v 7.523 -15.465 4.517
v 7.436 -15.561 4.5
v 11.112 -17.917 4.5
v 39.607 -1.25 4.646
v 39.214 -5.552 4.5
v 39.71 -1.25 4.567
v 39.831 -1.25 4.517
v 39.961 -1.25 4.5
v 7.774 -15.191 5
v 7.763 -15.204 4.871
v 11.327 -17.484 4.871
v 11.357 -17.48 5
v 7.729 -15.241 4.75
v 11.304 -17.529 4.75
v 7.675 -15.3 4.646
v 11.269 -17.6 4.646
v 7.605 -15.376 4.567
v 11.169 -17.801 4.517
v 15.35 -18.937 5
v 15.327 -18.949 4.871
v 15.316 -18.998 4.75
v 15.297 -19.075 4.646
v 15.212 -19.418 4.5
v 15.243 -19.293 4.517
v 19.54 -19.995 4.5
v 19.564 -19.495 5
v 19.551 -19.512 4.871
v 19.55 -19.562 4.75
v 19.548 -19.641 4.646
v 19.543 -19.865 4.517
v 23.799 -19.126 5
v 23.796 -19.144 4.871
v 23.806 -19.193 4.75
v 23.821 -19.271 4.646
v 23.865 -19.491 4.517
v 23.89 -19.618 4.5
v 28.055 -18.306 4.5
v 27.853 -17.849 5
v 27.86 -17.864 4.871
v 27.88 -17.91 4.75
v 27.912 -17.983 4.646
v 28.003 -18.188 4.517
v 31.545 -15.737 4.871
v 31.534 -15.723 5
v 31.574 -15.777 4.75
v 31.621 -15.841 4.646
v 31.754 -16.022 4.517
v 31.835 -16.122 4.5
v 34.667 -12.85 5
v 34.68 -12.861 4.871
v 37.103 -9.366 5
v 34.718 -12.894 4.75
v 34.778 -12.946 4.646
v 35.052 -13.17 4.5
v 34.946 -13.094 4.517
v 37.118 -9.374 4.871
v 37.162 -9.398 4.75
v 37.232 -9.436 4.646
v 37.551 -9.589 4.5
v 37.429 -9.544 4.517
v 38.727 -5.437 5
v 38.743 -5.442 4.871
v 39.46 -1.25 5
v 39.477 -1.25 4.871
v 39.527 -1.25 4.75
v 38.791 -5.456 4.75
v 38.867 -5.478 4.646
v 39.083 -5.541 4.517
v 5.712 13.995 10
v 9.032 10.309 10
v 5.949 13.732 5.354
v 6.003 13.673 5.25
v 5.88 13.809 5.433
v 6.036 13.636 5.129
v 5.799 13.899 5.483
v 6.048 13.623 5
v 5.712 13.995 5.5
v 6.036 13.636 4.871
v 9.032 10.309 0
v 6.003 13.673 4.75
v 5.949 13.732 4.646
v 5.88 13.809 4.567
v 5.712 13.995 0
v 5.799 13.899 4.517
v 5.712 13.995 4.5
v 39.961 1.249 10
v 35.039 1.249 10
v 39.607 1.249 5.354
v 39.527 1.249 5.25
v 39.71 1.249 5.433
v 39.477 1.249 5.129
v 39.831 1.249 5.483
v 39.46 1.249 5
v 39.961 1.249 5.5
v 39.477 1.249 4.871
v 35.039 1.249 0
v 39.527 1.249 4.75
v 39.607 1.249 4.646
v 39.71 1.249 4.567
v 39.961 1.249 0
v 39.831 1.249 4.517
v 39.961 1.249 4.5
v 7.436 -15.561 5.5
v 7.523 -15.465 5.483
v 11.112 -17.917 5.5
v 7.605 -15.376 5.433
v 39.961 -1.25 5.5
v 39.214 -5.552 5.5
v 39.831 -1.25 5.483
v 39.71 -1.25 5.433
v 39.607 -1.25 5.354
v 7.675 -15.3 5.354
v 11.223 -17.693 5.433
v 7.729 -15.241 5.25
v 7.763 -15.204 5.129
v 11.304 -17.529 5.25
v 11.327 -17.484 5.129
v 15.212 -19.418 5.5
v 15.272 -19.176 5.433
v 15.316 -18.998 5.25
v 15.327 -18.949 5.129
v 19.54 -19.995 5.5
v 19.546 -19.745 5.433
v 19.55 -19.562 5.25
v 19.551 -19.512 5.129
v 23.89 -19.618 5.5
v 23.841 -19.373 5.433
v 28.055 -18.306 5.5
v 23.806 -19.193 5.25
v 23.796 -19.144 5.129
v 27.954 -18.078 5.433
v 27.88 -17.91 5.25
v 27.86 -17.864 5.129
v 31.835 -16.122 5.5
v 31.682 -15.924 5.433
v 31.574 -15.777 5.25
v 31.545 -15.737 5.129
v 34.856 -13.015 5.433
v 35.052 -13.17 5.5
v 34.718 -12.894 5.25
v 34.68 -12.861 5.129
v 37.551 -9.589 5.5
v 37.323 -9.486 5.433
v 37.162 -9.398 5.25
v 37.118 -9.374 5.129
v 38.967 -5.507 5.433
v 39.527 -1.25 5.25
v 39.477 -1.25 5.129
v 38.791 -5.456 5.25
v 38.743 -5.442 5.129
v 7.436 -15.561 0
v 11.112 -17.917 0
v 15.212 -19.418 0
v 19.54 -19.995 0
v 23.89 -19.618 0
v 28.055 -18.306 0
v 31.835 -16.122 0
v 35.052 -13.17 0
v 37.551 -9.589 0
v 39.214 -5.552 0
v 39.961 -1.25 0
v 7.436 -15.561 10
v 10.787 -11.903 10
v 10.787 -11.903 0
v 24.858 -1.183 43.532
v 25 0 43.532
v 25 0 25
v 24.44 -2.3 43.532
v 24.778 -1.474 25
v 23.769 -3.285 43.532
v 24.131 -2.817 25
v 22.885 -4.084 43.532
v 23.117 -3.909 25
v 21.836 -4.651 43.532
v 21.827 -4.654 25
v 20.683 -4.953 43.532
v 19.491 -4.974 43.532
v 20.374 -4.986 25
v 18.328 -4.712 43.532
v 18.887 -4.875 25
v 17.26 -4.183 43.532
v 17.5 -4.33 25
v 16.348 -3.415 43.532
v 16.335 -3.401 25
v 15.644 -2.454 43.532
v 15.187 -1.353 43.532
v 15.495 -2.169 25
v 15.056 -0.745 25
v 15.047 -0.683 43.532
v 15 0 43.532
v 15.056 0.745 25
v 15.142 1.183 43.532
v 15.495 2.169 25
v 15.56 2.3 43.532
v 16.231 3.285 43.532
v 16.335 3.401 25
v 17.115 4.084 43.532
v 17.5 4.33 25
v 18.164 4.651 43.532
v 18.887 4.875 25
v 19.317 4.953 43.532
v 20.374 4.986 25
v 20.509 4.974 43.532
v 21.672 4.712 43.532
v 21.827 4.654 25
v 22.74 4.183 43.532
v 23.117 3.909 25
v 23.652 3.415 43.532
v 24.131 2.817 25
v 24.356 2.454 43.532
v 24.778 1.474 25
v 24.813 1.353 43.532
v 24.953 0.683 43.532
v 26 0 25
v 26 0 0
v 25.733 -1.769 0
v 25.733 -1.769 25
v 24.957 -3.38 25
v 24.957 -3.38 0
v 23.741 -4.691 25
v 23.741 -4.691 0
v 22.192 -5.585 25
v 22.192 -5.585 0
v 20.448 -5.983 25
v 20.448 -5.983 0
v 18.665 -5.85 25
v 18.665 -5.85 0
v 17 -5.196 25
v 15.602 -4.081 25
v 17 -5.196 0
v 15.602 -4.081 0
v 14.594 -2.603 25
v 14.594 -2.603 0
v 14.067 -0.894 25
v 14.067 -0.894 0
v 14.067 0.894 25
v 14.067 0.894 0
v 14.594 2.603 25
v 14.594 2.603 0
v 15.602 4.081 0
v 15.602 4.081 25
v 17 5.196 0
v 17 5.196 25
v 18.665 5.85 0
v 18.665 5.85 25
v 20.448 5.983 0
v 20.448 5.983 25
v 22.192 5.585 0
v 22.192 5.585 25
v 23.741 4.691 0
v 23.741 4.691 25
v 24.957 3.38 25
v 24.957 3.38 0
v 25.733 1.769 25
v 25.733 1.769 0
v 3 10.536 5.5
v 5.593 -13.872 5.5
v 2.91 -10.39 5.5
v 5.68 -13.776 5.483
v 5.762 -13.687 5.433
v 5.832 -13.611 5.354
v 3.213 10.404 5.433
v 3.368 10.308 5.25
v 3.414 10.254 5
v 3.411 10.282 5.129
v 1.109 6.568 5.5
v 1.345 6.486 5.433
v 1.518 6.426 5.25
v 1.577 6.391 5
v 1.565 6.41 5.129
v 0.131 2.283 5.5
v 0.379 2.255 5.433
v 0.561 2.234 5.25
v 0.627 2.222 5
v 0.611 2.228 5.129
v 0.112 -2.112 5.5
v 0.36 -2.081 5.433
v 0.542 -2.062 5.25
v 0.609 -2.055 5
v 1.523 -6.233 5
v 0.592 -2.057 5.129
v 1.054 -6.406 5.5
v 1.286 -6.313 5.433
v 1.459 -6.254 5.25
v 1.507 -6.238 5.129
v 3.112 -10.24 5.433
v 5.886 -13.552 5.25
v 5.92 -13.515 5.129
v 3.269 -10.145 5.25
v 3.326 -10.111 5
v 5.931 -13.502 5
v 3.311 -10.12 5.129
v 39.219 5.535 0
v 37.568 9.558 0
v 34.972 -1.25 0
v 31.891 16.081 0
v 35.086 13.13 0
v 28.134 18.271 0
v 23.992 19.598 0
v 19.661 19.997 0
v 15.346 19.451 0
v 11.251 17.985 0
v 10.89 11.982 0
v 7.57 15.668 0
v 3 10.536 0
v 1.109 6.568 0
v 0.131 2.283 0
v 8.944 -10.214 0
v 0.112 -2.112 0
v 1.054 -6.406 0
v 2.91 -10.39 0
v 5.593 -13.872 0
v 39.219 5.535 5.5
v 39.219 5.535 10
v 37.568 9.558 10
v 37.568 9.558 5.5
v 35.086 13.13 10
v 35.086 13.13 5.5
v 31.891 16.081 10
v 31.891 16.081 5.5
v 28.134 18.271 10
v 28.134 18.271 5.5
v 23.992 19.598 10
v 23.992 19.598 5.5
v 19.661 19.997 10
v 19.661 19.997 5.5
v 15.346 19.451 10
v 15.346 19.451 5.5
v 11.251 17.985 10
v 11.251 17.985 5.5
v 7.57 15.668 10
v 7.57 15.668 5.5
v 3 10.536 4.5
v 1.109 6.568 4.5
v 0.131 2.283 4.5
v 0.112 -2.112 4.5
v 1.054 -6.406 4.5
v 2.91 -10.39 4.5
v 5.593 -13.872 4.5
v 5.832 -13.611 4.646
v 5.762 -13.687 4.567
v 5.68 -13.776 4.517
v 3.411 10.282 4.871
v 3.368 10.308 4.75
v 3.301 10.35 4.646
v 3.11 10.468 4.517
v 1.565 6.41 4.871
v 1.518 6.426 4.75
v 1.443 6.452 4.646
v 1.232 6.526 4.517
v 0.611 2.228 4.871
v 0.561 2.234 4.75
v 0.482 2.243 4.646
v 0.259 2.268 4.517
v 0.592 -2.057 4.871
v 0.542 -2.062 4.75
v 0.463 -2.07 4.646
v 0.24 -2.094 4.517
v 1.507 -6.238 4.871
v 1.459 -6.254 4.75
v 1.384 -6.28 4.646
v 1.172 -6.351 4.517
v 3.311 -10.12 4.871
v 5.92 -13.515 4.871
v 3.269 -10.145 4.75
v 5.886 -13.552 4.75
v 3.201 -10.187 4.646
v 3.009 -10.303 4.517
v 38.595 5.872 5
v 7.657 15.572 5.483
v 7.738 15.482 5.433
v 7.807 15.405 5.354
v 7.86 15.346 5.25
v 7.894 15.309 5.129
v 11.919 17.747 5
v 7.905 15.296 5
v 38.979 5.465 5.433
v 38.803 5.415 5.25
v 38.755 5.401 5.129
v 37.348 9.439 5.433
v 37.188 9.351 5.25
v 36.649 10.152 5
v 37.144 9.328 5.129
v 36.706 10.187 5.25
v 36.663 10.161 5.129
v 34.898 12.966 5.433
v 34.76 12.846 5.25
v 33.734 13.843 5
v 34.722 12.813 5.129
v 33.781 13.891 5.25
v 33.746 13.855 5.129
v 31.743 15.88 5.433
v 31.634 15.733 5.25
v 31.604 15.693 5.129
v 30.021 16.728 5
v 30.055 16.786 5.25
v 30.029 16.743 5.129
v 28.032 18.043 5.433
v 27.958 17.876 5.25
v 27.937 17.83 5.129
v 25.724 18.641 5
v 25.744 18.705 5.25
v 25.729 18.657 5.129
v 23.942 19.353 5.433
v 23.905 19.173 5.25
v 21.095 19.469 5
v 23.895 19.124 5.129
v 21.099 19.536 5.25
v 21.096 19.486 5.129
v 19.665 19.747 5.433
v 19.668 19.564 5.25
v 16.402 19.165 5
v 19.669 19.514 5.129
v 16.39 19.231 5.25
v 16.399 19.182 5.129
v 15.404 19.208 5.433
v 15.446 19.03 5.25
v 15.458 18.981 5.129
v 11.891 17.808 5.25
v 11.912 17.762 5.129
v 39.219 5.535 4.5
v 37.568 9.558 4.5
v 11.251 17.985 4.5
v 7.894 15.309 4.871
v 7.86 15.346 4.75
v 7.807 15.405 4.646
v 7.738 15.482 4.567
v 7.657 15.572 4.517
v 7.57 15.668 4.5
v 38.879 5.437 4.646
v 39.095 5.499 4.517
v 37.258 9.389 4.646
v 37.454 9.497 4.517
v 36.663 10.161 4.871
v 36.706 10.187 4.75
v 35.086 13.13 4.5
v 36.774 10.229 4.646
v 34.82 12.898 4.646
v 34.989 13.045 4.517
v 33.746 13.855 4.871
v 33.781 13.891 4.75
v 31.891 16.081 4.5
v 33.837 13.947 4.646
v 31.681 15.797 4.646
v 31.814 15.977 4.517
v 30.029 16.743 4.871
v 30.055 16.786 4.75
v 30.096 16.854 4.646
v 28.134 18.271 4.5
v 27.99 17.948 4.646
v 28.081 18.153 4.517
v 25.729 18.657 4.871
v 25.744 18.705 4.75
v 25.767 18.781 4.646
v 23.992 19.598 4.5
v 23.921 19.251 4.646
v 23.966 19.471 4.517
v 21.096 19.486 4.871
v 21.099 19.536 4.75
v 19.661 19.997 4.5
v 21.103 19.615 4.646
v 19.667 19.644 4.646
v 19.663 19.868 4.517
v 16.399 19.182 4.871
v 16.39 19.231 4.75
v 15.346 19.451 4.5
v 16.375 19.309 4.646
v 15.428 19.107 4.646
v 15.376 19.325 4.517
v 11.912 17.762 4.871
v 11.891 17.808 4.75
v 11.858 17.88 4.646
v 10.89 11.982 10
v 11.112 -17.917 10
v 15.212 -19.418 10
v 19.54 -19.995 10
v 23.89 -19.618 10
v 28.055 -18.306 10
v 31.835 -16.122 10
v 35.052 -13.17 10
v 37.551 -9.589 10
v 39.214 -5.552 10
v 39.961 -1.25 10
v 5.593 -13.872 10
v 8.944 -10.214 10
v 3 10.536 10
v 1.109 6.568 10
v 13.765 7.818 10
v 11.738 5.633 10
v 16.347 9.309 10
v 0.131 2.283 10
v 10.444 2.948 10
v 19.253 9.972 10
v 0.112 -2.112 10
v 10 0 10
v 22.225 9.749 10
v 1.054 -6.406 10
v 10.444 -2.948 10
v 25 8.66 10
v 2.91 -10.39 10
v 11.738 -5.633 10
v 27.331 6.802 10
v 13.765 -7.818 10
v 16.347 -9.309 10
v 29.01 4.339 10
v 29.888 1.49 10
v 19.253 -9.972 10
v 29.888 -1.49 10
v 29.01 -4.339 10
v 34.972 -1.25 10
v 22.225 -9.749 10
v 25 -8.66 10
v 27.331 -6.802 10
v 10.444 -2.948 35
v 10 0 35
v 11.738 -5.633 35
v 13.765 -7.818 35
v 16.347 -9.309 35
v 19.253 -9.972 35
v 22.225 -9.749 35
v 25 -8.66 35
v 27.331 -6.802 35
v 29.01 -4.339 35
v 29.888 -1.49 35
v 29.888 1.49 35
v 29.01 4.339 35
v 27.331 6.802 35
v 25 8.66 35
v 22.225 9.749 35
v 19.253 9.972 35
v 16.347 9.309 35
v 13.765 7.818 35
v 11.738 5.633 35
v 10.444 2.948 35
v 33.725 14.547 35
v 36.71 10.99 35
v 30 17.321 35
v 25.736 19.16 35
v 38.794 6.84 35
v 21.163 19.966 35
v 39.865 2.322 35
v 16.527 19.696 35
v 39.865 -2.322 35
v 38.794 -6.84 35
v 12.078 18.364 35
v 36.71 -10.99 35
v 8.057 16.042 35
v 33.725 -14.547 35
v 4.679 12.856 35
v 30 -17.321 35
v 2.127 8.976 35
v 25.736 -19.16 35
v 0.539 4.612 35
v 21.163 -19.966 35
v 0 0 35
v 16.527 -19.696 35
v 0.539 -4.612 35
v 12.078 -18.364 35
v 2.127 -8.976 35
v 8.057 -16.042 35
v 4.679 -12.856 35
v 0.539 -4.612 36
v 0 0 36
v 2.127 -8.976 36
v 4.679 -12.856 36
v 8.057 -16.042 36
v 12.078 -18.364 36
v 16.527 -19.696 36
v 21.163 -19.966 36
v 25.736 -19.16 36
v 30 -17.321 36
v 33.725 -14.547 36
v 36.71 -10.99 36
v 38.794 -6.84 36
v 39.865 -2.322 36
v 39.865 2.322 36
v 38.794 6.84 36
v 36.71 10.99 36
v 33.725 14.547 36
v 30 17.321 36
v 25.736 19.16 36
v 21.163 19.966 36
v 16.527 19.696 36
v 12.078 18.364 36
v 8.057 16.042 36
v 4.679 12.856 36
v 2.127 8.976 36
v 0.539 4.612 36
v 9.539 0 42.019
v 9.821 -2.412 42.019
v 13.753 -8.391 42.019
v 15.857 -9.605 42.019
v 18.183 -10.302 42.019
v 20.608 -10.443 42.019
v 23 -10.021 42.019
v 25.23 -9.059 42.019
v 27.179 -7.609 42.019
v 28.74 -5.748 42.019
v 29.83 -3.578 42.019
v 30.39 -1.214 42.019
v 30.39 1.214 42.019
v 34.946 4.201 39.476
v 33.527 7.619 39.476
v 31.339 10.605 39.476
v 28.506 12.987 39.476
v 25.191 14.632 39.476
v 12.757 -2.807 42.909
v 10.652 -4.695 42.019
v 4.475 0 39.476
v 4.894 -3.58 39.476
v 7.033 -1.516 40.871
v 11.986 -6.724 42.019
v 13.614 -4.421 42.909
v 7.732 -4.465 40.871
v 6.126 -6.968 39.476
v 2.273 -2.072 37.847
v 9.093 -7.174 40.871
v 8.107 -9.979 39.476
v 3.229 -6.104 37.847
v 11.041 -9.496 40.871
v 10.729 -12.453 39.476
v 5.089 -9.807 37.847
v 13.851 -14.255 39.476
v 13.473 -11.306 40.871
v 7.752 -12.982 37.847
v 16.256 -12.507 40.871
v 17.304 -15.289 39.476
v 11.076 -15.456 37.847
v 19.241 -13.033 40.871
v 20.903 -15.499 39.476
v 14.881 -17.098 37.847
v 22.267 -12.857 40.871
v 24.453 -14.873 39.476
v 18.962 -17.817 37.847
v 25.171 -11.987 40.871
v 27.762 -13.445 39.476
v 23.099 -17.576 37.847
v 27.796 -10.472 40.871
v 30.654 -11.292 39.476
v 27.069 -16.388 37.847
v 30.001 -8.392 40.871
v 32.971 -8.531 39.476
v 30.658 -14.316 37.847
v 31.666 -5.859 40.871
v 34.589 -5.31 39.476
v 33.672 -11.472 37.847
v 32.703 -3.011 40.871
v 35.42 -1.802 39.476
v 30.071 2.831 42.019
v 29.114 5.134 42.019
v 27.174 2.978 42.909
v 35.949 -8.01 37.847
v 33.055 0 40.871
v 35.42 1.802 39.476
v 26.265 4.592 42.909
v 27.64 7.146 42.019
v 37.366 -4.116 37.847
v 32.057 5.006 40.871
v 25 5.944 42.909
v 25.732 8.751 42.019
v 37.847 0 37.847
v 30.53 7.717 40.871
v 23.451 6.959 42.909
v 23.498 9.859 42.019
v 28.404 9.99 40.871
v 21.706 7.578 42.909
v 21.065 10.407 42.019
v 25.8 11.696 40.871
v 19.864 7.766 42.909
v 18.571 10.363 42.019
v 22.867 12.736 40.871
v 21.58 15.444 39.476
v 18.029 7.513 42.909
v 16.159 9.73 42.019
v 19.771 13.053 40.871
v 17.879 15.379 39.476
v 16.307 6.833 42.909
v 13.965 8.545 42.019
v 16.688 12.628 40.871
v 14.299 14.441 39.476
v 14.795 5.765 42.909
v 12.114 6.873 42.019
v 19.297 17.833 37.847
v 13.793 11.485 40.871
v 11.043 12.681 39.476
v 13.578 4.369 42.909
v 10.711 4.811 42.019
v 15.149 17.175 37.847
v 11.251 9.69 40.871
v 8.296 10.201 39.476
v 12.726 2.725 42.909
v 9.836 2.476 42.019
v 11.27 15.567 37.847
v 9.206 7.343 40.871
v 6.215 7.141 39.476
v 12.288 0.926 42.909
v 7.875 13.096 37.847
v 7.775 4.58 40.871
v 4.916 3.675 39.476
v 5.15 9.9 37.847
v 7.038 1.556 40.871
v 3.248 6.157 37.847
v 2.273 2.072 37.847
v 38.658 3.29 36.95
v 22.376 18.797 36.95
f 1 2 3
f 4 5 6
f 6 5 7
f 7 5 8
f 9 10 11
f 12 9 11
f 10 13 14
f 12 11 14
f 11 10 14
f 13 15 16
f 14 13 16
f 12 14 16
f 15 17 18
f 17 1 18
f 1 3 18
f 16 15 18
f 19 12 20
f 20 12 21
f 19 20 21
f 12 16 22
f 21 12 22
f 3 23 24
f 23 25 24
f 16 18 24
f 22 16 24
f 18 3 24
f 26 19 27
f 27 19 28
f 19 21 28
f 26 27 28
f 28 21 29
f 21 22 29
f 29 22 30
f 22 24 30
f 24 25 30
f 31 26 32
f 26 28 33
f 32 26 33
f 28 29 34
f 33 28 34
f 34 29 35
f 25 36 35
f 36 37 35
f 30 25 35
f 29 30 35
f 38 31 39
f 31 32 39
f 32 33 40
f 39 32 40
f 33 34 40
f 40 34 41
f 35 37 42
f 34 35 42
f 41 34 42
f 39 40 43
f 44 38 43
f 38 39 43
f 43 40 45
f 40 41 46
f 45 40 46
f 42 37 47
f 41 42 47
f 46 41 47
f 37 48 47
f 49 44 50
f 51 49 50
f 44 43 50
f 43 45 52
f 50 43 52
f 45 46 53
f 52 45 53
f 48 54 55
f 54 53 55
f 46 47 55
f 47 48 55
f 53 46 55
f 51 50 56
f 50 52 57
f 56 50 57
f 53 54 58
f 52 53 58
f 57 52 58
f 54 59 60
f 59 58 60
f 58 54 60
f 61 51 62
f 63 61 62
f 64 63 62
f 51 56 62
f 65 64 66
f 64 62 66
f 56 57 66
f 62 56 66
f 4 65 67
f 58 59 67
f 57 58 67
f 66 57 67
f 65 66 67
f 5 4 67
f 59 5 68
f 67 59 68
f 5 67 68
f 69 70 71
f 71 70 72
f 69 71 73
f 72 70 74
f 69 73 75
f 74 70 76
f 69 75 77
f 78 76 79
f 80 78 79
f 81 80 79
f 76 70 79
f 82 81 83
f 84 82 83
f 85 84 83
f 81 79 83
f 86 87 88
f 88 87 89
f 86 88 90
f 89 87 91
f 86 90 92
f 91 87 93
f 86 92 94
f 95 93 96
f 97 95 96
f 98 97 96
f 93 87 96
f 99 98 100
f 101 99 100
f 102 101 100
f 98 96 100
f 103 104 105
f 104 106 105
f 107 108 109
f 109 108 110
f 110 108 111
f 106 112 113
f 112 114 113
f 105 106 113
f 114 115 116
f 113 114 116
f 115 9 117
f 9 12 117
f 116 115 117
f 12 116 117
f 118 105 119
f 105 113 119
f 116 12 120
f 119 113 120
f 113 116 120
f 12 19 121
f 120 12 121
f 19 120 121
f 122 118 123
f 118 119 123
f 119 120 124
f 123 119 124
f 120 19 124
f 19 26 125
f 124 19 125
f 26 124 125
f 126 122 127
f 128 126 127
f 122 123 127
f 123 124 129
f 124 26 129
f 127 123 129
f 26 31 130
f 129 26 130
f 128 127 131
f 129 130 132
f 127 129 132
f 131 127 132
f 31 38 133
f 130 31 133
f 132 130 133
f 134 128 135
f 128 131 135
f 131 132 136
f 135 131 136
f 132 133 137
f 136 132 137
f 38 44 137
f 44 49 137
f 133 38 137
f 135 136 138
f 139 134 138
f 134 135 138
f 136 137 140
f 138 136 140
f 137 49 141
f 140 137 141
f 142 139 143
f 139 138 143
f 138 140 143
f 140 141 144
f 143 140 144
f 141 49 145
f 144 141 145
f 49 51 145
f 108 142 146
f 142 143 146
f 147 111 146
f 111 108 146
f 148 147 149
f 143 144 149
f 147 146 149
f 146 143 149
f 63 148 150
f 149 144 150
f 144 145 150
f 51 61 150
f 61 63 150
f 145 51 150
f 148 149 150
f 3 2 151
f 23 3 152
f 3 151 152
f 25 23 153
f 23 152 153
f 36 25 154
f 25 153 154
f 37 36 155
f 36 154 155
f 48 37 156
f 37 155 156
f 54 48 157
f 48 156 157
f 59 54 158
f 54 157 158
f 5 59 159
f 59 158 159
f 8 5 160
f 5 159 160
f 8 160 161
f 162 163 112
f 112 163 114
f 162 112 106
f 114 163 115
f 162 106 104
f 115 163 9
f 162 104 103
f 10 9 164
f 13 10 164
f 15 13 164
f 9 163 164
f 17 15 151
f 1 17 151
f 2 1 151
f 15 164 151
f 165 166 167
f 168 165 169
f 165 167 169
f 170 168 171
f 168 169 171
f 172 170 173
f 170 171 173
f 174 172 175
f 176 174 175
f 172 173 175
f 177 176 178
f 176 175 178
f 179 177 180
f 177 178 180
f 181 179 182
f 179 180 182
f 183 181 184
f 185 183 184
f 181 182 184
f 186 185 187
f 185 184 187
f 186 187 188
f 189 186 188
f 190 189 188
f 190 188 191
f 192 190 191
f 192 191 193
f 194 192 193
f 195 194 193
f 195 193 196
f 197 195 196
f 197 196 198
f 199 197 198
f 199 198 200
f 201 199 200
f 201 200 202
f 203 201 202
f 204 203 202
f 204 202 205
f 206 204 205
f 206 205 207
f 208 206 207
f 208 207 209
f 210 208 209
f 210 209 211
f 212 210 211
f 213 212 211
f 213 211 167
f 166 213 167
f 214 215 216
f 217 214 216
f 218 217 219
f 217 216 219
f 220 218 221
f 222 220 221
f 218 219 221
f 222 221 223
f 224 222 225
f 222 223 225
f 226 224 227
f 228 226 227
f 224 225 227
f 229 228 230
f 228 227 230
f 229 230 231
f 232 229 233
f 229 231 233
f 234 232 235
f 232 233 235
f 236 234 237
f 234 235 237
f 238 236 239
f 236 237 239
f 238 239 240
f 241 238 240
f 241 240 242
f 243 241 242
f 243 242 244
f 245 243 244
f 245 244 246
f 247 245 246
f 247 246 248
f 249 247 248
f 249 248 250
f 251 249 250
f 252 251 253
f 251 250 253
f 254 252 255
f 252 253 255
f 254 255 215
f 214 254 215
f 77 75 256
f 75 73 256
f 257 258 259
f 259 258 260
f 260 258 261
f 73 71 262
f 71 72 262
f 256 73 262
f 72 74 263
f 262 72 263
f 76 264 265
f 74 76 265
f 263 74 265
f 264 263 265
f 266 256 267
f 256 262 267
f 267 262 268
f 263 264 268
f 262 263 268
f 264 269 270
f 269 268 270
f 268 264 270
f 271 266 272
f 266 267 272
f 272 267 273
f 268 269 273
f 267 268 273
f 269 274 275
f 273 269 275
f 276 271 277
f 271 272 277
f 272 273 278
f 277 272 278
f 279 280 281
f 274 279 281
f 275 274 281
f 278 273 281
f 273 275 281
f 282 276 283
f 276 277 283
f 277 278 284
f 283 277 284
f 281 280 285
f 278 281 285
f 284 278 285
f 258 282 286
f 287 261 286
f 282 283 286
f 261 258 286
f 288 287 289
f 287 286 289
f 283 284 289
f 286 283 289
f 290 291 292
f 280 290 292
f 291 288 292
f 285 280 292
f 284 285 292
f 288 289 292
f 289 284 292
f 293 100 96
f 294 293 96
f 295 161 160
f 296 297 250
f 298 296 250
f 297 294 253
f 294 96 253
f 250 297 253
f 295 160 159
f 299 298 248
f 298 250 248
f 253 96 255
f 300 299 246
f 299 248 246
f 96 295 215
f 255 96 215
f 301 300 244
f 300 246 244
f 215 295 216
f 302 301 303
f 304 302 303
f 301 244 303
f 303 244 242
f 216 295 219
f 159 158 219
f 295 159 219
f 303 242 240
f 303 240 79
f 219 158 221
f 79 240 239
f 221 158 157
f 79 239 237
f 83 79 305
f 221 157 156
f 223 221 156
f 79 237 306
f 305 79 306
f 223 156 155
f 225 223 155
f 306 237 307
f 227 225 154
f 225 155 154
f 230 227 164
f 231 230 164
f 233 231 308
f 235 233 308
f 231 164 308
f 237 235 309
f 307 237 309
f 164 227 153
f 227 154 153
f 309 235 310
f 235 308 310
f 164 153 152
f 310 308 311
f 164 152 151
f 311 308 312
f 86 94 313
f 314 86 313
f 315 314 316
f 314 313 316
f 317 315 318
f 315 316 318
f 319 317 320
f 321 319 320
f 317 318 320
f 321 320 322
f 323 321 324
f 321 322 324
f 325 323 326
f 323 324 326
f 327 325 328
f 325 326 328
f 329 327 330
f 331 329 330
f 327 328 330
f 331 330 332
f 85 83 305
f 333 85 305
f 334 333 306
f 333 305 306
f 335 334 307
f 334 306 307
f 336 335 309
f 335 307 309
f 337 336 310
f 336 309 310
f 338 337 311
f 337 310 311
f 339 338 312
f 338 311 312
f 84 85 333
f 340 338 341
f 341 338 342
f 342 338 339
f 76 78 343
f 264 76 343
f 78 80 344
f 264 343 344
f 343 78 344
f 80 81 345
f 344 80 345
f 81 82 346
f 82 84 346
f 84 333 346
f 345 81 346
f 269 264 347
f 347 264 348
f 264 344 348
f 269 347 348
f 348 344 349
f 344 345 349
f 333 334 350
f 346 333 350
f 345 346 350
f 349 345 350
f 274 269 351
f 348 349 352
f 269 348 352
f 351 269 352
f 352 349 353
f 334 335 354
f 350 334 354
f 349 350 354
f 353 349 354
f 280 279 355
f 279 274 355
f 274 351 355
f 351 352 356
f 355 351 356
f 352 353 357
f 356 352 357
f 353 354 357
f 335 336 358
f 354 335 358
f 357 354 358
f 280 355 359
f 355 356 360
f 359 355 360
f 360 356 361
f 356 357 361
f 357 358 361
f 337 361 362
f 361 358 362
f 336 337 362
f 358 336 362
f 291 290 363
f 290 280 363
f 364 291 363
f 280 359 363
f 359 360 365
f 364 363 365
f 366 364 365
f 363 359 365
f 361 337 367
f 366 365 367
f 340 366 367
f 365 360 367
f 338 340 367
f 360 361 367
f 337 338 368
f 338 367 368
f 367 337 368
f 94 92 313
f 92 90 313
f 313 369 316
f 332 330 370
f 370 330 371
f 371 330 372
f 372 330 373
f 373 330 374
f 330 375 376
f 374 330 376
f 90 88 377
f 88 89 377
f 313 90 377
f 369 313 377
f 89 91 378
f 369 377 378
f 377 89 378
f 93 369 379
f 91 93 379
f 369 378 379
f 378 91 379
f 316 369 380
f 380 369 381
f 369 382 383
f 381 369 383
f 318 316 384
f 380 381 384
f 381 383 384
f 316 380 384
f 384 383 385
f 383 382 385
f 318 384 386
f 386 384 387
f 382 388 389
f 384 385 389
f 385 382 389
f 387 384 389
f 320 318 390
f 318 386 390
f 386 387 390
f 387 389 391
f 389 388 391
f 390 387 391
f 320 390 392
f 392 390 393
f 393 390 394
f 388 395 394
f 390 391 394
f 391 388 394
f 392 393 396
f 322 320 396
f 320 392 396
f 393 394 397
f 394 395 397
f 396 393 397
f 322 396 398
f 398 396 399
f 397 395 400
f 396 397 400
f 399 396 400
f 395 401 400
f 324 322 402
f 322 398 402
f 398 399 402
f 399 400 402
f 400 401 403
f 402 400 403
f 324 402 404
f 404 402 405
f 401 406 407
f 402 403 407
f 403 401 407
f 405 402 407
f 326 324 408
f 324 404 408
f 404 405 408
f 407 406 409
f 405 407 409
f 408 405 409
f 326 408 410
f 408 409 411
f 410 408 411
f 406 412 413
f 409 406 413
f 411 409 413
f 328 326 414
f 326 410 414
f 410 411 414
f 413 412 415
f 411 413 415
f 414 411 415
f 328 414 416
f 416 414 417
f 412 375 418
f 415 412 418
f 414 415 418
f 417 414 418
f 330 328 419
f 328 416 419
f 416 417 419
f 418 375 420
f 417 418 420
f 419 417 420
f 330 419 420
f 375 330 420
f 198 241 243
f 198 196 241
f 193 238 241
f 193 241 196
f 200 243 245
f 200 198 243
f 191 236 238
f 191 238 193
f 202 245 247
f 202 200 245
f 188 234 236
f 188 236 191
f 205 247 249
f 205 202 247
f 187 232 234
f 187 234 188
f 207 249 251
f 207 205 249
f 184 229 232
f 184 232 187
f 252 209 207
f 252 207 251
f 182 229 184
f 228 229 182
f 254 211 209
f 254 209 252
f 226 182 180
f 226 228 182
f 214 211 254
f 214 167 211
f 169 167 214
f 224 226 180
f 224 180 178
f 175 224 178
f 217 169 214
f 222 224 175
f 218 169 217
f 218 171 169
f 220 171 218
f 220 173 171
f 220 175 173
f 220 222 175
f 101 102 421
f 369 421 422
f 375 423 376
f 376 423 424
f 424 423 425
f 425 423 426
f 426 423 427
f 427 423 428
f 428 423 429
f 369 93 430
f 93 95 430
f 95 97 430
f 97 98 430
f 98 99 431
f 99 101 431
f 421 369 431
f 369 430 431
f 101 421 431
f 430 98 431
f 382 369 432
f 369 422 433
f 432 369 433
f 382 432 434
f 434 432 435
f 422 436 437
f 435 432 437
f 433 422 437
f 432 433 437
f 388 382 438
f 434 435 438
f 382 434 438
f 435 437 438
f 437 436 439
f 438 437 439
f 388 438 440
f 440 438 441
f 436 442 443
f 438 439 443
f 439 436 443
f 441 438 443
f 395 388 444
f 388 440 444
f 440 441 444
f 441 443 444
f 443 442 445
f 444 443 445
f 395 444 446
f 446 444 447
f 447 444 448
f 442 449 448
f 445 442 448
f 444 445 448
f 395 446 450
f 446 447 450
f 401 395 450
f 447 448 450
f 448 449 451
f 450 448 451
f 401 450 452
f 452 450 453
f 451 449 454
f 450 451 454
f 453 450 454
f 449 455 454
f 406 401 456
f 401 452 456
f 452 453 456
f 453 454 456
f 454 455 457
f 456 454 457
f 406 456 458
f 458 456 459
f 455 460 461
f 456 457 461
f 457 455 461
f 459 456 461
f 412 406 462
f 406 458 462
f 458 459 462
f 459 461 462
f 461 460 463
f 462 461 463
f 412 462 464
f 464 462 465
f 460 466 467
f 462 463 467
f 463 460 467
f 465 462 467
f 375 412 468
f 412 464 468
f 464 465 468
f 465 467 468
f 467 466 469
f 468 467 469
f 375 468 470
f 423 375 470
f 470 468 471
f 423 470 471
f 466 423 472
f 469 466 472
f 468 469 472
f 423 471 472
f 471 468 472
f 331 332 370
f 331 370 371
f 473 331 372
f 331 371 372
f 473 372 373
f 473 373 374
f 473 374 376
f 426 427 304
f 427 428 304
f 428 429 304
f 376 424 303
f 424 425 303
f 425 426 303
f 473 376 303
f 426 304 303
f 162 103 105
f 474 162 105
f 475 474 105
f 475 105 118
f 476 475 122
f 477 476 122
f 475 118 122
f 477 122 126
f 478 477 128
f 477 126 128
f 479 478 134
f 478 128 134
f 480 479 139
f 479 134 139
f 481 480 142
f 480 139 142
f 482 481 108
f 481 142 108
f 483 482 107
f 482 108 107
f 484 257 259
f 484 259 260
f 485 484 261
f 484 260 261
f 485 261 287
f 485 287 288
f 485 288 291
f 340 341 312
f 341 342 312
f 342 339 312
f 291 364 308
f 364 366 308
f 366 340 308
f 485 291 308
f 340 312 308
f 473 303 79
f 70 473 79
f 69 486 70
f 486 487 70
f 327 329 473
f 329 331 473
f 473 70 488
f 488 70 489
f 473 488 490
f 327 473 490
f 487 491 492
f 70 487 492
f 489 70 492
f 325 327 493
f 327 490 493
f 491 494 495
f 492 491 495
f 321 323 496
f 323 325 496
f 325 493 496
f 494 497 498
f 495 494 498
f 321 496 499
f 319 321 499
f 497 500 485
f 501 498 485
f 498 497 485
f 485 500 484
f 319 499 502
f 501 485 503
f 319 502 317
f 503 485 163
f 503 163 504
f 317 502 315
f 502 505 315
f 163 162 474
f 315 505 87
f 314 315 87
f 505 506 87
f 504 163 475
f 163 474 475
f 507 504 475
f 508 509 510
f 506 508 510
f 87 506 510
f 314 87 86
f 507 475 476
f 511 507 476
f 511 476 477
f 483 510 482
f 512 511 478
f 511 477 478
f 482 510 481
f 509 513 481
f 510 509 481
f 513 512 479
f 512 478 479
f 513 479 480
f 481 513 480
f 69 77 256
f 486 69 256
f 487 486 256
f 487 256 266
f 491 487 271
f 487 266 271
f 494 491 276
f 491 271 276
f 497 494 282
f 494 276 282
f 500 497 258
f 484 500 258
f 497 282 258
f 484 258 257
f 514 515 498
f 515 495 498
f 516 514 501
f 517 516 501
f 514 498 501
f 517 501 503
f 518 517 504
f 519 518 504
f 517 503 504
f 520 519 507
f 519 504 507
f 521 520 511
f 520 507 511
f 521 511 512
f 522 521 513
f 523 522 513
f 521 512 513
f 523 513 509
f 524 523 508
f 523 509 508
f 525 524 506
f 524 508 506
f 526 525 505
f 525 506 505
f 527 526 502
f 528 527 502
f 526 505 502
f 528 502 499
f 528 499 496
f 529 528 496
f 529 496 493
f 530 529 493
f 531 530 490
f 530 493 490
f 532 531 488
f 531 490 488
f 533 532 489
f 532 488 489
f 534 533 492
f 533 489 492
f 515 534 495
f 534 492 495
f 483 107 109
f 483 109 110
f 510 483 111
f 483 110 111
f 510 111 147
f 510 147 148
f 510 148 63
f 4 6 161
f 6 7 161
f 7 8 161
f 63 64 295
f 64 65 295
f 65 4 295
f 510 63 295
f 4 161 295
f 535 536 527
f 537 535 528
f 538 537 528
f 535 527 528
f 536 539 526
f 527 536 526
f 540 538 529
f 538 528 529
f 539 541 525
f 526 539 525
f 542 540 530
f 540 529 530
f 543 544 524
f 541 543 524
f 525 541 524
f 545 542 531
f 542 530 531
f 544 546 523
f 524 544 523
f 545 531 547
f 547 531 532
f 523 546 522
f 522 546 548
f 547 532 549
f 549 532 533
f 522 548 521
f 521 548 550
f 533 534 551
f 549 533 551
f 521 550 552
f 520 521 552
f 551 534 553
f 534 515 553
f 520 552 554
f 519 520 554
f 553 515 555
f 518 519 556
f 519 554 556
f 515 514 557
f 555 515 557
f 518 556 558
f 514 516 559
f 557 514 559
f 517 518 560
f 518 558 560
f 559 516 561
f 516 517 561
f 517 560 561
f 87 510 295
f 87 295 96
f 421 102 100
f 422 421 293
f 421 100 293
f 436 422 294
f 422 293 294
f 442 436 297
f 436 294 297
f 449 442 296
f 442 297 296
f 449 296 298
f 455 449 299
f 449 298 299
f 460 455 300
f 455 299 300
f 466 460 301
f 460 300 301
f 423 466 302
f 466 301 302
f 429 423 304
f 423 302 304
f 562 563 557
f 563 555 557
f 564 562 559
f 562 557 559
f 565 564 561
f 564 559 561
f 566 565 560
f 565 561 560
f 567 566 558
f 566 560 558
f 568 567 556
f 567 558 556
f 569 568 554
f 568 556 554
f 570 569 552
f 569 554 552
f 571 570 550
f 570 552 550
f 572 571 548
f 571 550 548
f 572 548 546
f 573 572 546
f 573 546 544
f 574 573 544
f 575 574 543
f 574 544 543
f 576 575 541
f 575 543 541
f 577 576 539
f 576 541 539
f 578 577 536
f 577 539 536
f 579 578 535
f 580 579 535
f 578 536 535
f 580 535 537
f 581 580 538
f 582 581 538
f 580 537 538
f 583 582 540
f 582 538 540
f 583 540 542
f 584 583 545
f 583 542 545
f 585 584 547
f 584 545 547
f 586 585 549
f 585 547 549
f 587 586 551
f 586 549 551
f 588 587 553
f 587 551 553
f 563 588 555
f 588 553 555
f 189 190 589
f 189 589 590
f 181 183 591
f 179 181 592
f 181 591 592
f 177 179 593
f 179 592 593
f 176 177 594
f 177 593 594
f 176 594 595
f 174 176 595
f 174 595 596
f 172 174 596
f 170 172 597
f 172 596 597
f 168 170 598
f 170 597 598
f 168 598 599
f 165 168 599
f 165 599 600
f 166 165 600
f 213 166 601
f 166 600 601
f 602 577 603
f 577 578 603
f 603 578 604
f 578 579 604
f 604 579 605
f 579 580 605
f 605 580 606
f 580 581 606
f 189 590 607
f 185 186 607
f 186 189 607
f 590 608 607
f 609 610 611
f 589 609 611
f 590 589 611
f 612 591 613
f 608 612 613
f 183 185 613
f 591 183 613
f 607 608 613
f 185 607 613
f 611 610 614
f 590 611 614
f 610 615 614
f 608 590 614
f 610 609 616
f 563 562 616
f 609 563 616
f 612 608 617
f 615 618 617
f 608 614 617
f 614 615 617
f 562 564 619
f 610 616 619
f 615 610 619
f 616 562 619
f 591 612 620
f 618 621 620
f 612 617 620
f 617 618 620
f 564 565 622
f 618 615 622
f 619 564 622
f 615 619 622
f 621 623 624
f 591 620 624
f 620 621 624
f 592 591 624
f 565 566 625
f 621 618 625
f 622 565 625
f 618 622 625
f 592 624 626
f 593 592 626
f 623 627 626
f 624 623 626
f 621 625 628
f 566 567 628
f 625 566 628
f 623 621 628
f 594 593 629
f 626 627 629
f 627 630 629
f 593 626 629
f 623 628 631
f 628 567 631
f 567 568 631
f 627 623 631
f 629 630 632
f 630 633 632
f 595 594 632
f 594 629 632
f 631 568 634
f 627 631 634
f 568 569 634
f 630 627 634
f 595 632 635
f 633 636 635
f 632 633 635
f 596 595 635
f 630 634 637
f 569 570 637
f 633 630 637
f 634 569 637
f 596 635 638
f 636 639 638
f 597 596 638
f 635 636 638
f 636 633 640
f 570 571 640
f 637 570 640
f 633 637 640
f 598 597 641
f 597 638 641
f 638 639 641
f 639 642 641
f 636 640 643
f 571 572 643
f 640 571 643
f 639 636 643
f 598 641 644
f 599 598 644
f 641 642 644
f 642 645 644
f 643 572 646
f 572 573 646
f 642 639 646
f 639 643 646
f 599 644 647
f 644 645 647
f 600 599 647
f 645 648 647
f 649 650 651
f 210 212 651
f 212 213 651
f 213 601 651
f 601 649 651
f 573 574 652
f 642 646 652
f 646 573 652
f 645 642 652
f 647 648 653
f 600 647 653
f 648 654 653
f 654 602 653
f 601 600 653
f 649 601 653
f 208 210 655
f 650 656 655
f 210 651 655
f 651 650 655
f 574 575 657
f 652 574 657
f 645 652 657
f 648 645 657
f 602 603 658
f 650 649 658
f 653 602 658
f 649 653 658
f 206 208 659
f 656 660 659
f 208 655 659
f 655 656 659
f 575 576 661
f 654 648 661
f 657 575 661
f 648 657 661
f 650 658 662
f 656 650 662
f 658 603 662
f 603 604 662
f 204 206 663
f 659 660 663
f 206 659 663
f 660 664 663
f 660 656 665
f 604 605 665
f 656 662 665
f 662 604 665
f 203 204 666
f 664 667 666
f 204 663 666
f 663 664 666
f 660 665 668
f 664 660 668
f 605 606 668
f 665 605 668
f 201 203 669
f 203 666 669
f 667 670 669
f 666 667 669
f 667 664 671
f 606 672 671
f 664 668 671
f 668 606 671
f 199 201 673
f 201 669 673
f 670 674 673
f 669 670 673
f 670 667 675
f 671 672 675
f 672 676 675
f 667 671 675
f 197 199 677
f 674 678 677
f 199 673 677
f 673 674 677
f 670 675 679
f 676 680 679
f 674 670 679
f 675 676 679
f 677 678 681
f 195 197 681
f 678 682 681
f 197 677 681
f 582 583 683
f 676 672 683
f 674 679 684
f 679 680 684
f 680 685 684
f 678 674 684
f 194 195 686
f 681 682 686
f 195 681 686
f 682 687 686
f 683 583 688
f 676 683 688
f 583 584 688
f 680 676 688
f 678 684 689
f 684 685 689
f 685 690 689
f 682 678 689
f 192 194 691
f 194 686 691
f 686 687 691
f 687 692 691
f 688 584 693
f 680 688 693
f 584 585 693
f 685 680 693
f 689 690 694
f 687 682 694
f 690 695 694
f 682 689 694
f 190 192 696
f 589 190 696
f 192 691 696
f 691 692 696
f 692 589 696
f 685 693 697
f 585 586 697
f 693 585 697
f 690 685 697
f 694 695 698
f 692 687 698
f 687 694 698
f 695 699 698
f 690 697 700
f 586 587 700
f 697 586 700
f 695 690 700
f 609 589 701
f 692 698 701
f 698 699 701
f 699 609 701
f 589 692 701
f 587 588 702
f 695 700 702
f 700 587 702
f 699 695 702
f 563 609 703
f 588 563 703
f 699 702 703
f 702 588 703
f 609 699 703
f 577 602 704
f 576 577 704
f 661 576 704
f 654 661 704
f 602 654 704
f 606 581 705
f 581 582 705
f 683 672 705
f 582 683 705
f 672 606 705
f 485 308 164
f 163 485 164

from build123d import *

# Parameters (mm, degrees)
F2_R     = 5
F3_DEPTH = 43.9649
F4_R     = 6
F5_DEPTH = 25


with BuildPart() as f1:
    # F0 (on Front) → F1 (revolve)
    with BuildSketch(Plane.XZ):
        with BuildLine():
            Line((0, 4.5), (0, 0))
            Line((0, 0), (20, 0))
            Line((20, 0), (20, 43.964899))
            ThreePointArc((20, 43.964899), (9.236176, 41.900424), (0, 36))
            Line((0, 36), (0, 35))
            Line((0, 35), (10, 35))
            Line((10, 35), (10, 10))
            Line((10, 10), (0, 10))
            Line((0, 10), (0, 5.5))
            ThreePointArc((0, 5.5), (0.353553, 5.353553), (0.5, 5))
            ThreePointArc((0.5, 5), (0.353553, 4.646447), (0, 4.5))
        make_face()
    revolve(axis=Axis((20, 0, 21.982449), (0, 0, 1)))

    # F2 (on face) → F3 (cut)
    with BuildSketch(Plane(origin=(0, 0, 0), x_dir=(1, 0, 0), z_dir=(0, 0, -1))):
        with Locations((20, 0)):
            Circle(F2_R)
    extrude(amount=-F3_DEPTH, mode=Mode.SUBTRACT)

    # F4 (on face) → F5 (cut)
    with BuildSketch(Plane(origin=(0, 0, 0), x_dir=(1, 0, 0), z_dir=(0, 0, -1))):
        with Locations((20, 0)):
            Circle(F4_R)
        Polygon((8.944216, 10.214311), (10.787355, 11.903347), (6.733669, 16.326878), (4.890531, 14.637843), align=None)
        Polygon((35.039323, -1.249084), (41.039323, -1.249084), (40.971649, 1.25), (34.971649, 1.25), align=None)
        Polygon((9.032436, -10.308979), (5.016928, -14.767196), (6.874519, -16.440324), (10.890026, -11.982107), align=None)
    extrude(amount=-F5_DEPTH, mode=Mode.SUBTRACT)


solid = f1.part
